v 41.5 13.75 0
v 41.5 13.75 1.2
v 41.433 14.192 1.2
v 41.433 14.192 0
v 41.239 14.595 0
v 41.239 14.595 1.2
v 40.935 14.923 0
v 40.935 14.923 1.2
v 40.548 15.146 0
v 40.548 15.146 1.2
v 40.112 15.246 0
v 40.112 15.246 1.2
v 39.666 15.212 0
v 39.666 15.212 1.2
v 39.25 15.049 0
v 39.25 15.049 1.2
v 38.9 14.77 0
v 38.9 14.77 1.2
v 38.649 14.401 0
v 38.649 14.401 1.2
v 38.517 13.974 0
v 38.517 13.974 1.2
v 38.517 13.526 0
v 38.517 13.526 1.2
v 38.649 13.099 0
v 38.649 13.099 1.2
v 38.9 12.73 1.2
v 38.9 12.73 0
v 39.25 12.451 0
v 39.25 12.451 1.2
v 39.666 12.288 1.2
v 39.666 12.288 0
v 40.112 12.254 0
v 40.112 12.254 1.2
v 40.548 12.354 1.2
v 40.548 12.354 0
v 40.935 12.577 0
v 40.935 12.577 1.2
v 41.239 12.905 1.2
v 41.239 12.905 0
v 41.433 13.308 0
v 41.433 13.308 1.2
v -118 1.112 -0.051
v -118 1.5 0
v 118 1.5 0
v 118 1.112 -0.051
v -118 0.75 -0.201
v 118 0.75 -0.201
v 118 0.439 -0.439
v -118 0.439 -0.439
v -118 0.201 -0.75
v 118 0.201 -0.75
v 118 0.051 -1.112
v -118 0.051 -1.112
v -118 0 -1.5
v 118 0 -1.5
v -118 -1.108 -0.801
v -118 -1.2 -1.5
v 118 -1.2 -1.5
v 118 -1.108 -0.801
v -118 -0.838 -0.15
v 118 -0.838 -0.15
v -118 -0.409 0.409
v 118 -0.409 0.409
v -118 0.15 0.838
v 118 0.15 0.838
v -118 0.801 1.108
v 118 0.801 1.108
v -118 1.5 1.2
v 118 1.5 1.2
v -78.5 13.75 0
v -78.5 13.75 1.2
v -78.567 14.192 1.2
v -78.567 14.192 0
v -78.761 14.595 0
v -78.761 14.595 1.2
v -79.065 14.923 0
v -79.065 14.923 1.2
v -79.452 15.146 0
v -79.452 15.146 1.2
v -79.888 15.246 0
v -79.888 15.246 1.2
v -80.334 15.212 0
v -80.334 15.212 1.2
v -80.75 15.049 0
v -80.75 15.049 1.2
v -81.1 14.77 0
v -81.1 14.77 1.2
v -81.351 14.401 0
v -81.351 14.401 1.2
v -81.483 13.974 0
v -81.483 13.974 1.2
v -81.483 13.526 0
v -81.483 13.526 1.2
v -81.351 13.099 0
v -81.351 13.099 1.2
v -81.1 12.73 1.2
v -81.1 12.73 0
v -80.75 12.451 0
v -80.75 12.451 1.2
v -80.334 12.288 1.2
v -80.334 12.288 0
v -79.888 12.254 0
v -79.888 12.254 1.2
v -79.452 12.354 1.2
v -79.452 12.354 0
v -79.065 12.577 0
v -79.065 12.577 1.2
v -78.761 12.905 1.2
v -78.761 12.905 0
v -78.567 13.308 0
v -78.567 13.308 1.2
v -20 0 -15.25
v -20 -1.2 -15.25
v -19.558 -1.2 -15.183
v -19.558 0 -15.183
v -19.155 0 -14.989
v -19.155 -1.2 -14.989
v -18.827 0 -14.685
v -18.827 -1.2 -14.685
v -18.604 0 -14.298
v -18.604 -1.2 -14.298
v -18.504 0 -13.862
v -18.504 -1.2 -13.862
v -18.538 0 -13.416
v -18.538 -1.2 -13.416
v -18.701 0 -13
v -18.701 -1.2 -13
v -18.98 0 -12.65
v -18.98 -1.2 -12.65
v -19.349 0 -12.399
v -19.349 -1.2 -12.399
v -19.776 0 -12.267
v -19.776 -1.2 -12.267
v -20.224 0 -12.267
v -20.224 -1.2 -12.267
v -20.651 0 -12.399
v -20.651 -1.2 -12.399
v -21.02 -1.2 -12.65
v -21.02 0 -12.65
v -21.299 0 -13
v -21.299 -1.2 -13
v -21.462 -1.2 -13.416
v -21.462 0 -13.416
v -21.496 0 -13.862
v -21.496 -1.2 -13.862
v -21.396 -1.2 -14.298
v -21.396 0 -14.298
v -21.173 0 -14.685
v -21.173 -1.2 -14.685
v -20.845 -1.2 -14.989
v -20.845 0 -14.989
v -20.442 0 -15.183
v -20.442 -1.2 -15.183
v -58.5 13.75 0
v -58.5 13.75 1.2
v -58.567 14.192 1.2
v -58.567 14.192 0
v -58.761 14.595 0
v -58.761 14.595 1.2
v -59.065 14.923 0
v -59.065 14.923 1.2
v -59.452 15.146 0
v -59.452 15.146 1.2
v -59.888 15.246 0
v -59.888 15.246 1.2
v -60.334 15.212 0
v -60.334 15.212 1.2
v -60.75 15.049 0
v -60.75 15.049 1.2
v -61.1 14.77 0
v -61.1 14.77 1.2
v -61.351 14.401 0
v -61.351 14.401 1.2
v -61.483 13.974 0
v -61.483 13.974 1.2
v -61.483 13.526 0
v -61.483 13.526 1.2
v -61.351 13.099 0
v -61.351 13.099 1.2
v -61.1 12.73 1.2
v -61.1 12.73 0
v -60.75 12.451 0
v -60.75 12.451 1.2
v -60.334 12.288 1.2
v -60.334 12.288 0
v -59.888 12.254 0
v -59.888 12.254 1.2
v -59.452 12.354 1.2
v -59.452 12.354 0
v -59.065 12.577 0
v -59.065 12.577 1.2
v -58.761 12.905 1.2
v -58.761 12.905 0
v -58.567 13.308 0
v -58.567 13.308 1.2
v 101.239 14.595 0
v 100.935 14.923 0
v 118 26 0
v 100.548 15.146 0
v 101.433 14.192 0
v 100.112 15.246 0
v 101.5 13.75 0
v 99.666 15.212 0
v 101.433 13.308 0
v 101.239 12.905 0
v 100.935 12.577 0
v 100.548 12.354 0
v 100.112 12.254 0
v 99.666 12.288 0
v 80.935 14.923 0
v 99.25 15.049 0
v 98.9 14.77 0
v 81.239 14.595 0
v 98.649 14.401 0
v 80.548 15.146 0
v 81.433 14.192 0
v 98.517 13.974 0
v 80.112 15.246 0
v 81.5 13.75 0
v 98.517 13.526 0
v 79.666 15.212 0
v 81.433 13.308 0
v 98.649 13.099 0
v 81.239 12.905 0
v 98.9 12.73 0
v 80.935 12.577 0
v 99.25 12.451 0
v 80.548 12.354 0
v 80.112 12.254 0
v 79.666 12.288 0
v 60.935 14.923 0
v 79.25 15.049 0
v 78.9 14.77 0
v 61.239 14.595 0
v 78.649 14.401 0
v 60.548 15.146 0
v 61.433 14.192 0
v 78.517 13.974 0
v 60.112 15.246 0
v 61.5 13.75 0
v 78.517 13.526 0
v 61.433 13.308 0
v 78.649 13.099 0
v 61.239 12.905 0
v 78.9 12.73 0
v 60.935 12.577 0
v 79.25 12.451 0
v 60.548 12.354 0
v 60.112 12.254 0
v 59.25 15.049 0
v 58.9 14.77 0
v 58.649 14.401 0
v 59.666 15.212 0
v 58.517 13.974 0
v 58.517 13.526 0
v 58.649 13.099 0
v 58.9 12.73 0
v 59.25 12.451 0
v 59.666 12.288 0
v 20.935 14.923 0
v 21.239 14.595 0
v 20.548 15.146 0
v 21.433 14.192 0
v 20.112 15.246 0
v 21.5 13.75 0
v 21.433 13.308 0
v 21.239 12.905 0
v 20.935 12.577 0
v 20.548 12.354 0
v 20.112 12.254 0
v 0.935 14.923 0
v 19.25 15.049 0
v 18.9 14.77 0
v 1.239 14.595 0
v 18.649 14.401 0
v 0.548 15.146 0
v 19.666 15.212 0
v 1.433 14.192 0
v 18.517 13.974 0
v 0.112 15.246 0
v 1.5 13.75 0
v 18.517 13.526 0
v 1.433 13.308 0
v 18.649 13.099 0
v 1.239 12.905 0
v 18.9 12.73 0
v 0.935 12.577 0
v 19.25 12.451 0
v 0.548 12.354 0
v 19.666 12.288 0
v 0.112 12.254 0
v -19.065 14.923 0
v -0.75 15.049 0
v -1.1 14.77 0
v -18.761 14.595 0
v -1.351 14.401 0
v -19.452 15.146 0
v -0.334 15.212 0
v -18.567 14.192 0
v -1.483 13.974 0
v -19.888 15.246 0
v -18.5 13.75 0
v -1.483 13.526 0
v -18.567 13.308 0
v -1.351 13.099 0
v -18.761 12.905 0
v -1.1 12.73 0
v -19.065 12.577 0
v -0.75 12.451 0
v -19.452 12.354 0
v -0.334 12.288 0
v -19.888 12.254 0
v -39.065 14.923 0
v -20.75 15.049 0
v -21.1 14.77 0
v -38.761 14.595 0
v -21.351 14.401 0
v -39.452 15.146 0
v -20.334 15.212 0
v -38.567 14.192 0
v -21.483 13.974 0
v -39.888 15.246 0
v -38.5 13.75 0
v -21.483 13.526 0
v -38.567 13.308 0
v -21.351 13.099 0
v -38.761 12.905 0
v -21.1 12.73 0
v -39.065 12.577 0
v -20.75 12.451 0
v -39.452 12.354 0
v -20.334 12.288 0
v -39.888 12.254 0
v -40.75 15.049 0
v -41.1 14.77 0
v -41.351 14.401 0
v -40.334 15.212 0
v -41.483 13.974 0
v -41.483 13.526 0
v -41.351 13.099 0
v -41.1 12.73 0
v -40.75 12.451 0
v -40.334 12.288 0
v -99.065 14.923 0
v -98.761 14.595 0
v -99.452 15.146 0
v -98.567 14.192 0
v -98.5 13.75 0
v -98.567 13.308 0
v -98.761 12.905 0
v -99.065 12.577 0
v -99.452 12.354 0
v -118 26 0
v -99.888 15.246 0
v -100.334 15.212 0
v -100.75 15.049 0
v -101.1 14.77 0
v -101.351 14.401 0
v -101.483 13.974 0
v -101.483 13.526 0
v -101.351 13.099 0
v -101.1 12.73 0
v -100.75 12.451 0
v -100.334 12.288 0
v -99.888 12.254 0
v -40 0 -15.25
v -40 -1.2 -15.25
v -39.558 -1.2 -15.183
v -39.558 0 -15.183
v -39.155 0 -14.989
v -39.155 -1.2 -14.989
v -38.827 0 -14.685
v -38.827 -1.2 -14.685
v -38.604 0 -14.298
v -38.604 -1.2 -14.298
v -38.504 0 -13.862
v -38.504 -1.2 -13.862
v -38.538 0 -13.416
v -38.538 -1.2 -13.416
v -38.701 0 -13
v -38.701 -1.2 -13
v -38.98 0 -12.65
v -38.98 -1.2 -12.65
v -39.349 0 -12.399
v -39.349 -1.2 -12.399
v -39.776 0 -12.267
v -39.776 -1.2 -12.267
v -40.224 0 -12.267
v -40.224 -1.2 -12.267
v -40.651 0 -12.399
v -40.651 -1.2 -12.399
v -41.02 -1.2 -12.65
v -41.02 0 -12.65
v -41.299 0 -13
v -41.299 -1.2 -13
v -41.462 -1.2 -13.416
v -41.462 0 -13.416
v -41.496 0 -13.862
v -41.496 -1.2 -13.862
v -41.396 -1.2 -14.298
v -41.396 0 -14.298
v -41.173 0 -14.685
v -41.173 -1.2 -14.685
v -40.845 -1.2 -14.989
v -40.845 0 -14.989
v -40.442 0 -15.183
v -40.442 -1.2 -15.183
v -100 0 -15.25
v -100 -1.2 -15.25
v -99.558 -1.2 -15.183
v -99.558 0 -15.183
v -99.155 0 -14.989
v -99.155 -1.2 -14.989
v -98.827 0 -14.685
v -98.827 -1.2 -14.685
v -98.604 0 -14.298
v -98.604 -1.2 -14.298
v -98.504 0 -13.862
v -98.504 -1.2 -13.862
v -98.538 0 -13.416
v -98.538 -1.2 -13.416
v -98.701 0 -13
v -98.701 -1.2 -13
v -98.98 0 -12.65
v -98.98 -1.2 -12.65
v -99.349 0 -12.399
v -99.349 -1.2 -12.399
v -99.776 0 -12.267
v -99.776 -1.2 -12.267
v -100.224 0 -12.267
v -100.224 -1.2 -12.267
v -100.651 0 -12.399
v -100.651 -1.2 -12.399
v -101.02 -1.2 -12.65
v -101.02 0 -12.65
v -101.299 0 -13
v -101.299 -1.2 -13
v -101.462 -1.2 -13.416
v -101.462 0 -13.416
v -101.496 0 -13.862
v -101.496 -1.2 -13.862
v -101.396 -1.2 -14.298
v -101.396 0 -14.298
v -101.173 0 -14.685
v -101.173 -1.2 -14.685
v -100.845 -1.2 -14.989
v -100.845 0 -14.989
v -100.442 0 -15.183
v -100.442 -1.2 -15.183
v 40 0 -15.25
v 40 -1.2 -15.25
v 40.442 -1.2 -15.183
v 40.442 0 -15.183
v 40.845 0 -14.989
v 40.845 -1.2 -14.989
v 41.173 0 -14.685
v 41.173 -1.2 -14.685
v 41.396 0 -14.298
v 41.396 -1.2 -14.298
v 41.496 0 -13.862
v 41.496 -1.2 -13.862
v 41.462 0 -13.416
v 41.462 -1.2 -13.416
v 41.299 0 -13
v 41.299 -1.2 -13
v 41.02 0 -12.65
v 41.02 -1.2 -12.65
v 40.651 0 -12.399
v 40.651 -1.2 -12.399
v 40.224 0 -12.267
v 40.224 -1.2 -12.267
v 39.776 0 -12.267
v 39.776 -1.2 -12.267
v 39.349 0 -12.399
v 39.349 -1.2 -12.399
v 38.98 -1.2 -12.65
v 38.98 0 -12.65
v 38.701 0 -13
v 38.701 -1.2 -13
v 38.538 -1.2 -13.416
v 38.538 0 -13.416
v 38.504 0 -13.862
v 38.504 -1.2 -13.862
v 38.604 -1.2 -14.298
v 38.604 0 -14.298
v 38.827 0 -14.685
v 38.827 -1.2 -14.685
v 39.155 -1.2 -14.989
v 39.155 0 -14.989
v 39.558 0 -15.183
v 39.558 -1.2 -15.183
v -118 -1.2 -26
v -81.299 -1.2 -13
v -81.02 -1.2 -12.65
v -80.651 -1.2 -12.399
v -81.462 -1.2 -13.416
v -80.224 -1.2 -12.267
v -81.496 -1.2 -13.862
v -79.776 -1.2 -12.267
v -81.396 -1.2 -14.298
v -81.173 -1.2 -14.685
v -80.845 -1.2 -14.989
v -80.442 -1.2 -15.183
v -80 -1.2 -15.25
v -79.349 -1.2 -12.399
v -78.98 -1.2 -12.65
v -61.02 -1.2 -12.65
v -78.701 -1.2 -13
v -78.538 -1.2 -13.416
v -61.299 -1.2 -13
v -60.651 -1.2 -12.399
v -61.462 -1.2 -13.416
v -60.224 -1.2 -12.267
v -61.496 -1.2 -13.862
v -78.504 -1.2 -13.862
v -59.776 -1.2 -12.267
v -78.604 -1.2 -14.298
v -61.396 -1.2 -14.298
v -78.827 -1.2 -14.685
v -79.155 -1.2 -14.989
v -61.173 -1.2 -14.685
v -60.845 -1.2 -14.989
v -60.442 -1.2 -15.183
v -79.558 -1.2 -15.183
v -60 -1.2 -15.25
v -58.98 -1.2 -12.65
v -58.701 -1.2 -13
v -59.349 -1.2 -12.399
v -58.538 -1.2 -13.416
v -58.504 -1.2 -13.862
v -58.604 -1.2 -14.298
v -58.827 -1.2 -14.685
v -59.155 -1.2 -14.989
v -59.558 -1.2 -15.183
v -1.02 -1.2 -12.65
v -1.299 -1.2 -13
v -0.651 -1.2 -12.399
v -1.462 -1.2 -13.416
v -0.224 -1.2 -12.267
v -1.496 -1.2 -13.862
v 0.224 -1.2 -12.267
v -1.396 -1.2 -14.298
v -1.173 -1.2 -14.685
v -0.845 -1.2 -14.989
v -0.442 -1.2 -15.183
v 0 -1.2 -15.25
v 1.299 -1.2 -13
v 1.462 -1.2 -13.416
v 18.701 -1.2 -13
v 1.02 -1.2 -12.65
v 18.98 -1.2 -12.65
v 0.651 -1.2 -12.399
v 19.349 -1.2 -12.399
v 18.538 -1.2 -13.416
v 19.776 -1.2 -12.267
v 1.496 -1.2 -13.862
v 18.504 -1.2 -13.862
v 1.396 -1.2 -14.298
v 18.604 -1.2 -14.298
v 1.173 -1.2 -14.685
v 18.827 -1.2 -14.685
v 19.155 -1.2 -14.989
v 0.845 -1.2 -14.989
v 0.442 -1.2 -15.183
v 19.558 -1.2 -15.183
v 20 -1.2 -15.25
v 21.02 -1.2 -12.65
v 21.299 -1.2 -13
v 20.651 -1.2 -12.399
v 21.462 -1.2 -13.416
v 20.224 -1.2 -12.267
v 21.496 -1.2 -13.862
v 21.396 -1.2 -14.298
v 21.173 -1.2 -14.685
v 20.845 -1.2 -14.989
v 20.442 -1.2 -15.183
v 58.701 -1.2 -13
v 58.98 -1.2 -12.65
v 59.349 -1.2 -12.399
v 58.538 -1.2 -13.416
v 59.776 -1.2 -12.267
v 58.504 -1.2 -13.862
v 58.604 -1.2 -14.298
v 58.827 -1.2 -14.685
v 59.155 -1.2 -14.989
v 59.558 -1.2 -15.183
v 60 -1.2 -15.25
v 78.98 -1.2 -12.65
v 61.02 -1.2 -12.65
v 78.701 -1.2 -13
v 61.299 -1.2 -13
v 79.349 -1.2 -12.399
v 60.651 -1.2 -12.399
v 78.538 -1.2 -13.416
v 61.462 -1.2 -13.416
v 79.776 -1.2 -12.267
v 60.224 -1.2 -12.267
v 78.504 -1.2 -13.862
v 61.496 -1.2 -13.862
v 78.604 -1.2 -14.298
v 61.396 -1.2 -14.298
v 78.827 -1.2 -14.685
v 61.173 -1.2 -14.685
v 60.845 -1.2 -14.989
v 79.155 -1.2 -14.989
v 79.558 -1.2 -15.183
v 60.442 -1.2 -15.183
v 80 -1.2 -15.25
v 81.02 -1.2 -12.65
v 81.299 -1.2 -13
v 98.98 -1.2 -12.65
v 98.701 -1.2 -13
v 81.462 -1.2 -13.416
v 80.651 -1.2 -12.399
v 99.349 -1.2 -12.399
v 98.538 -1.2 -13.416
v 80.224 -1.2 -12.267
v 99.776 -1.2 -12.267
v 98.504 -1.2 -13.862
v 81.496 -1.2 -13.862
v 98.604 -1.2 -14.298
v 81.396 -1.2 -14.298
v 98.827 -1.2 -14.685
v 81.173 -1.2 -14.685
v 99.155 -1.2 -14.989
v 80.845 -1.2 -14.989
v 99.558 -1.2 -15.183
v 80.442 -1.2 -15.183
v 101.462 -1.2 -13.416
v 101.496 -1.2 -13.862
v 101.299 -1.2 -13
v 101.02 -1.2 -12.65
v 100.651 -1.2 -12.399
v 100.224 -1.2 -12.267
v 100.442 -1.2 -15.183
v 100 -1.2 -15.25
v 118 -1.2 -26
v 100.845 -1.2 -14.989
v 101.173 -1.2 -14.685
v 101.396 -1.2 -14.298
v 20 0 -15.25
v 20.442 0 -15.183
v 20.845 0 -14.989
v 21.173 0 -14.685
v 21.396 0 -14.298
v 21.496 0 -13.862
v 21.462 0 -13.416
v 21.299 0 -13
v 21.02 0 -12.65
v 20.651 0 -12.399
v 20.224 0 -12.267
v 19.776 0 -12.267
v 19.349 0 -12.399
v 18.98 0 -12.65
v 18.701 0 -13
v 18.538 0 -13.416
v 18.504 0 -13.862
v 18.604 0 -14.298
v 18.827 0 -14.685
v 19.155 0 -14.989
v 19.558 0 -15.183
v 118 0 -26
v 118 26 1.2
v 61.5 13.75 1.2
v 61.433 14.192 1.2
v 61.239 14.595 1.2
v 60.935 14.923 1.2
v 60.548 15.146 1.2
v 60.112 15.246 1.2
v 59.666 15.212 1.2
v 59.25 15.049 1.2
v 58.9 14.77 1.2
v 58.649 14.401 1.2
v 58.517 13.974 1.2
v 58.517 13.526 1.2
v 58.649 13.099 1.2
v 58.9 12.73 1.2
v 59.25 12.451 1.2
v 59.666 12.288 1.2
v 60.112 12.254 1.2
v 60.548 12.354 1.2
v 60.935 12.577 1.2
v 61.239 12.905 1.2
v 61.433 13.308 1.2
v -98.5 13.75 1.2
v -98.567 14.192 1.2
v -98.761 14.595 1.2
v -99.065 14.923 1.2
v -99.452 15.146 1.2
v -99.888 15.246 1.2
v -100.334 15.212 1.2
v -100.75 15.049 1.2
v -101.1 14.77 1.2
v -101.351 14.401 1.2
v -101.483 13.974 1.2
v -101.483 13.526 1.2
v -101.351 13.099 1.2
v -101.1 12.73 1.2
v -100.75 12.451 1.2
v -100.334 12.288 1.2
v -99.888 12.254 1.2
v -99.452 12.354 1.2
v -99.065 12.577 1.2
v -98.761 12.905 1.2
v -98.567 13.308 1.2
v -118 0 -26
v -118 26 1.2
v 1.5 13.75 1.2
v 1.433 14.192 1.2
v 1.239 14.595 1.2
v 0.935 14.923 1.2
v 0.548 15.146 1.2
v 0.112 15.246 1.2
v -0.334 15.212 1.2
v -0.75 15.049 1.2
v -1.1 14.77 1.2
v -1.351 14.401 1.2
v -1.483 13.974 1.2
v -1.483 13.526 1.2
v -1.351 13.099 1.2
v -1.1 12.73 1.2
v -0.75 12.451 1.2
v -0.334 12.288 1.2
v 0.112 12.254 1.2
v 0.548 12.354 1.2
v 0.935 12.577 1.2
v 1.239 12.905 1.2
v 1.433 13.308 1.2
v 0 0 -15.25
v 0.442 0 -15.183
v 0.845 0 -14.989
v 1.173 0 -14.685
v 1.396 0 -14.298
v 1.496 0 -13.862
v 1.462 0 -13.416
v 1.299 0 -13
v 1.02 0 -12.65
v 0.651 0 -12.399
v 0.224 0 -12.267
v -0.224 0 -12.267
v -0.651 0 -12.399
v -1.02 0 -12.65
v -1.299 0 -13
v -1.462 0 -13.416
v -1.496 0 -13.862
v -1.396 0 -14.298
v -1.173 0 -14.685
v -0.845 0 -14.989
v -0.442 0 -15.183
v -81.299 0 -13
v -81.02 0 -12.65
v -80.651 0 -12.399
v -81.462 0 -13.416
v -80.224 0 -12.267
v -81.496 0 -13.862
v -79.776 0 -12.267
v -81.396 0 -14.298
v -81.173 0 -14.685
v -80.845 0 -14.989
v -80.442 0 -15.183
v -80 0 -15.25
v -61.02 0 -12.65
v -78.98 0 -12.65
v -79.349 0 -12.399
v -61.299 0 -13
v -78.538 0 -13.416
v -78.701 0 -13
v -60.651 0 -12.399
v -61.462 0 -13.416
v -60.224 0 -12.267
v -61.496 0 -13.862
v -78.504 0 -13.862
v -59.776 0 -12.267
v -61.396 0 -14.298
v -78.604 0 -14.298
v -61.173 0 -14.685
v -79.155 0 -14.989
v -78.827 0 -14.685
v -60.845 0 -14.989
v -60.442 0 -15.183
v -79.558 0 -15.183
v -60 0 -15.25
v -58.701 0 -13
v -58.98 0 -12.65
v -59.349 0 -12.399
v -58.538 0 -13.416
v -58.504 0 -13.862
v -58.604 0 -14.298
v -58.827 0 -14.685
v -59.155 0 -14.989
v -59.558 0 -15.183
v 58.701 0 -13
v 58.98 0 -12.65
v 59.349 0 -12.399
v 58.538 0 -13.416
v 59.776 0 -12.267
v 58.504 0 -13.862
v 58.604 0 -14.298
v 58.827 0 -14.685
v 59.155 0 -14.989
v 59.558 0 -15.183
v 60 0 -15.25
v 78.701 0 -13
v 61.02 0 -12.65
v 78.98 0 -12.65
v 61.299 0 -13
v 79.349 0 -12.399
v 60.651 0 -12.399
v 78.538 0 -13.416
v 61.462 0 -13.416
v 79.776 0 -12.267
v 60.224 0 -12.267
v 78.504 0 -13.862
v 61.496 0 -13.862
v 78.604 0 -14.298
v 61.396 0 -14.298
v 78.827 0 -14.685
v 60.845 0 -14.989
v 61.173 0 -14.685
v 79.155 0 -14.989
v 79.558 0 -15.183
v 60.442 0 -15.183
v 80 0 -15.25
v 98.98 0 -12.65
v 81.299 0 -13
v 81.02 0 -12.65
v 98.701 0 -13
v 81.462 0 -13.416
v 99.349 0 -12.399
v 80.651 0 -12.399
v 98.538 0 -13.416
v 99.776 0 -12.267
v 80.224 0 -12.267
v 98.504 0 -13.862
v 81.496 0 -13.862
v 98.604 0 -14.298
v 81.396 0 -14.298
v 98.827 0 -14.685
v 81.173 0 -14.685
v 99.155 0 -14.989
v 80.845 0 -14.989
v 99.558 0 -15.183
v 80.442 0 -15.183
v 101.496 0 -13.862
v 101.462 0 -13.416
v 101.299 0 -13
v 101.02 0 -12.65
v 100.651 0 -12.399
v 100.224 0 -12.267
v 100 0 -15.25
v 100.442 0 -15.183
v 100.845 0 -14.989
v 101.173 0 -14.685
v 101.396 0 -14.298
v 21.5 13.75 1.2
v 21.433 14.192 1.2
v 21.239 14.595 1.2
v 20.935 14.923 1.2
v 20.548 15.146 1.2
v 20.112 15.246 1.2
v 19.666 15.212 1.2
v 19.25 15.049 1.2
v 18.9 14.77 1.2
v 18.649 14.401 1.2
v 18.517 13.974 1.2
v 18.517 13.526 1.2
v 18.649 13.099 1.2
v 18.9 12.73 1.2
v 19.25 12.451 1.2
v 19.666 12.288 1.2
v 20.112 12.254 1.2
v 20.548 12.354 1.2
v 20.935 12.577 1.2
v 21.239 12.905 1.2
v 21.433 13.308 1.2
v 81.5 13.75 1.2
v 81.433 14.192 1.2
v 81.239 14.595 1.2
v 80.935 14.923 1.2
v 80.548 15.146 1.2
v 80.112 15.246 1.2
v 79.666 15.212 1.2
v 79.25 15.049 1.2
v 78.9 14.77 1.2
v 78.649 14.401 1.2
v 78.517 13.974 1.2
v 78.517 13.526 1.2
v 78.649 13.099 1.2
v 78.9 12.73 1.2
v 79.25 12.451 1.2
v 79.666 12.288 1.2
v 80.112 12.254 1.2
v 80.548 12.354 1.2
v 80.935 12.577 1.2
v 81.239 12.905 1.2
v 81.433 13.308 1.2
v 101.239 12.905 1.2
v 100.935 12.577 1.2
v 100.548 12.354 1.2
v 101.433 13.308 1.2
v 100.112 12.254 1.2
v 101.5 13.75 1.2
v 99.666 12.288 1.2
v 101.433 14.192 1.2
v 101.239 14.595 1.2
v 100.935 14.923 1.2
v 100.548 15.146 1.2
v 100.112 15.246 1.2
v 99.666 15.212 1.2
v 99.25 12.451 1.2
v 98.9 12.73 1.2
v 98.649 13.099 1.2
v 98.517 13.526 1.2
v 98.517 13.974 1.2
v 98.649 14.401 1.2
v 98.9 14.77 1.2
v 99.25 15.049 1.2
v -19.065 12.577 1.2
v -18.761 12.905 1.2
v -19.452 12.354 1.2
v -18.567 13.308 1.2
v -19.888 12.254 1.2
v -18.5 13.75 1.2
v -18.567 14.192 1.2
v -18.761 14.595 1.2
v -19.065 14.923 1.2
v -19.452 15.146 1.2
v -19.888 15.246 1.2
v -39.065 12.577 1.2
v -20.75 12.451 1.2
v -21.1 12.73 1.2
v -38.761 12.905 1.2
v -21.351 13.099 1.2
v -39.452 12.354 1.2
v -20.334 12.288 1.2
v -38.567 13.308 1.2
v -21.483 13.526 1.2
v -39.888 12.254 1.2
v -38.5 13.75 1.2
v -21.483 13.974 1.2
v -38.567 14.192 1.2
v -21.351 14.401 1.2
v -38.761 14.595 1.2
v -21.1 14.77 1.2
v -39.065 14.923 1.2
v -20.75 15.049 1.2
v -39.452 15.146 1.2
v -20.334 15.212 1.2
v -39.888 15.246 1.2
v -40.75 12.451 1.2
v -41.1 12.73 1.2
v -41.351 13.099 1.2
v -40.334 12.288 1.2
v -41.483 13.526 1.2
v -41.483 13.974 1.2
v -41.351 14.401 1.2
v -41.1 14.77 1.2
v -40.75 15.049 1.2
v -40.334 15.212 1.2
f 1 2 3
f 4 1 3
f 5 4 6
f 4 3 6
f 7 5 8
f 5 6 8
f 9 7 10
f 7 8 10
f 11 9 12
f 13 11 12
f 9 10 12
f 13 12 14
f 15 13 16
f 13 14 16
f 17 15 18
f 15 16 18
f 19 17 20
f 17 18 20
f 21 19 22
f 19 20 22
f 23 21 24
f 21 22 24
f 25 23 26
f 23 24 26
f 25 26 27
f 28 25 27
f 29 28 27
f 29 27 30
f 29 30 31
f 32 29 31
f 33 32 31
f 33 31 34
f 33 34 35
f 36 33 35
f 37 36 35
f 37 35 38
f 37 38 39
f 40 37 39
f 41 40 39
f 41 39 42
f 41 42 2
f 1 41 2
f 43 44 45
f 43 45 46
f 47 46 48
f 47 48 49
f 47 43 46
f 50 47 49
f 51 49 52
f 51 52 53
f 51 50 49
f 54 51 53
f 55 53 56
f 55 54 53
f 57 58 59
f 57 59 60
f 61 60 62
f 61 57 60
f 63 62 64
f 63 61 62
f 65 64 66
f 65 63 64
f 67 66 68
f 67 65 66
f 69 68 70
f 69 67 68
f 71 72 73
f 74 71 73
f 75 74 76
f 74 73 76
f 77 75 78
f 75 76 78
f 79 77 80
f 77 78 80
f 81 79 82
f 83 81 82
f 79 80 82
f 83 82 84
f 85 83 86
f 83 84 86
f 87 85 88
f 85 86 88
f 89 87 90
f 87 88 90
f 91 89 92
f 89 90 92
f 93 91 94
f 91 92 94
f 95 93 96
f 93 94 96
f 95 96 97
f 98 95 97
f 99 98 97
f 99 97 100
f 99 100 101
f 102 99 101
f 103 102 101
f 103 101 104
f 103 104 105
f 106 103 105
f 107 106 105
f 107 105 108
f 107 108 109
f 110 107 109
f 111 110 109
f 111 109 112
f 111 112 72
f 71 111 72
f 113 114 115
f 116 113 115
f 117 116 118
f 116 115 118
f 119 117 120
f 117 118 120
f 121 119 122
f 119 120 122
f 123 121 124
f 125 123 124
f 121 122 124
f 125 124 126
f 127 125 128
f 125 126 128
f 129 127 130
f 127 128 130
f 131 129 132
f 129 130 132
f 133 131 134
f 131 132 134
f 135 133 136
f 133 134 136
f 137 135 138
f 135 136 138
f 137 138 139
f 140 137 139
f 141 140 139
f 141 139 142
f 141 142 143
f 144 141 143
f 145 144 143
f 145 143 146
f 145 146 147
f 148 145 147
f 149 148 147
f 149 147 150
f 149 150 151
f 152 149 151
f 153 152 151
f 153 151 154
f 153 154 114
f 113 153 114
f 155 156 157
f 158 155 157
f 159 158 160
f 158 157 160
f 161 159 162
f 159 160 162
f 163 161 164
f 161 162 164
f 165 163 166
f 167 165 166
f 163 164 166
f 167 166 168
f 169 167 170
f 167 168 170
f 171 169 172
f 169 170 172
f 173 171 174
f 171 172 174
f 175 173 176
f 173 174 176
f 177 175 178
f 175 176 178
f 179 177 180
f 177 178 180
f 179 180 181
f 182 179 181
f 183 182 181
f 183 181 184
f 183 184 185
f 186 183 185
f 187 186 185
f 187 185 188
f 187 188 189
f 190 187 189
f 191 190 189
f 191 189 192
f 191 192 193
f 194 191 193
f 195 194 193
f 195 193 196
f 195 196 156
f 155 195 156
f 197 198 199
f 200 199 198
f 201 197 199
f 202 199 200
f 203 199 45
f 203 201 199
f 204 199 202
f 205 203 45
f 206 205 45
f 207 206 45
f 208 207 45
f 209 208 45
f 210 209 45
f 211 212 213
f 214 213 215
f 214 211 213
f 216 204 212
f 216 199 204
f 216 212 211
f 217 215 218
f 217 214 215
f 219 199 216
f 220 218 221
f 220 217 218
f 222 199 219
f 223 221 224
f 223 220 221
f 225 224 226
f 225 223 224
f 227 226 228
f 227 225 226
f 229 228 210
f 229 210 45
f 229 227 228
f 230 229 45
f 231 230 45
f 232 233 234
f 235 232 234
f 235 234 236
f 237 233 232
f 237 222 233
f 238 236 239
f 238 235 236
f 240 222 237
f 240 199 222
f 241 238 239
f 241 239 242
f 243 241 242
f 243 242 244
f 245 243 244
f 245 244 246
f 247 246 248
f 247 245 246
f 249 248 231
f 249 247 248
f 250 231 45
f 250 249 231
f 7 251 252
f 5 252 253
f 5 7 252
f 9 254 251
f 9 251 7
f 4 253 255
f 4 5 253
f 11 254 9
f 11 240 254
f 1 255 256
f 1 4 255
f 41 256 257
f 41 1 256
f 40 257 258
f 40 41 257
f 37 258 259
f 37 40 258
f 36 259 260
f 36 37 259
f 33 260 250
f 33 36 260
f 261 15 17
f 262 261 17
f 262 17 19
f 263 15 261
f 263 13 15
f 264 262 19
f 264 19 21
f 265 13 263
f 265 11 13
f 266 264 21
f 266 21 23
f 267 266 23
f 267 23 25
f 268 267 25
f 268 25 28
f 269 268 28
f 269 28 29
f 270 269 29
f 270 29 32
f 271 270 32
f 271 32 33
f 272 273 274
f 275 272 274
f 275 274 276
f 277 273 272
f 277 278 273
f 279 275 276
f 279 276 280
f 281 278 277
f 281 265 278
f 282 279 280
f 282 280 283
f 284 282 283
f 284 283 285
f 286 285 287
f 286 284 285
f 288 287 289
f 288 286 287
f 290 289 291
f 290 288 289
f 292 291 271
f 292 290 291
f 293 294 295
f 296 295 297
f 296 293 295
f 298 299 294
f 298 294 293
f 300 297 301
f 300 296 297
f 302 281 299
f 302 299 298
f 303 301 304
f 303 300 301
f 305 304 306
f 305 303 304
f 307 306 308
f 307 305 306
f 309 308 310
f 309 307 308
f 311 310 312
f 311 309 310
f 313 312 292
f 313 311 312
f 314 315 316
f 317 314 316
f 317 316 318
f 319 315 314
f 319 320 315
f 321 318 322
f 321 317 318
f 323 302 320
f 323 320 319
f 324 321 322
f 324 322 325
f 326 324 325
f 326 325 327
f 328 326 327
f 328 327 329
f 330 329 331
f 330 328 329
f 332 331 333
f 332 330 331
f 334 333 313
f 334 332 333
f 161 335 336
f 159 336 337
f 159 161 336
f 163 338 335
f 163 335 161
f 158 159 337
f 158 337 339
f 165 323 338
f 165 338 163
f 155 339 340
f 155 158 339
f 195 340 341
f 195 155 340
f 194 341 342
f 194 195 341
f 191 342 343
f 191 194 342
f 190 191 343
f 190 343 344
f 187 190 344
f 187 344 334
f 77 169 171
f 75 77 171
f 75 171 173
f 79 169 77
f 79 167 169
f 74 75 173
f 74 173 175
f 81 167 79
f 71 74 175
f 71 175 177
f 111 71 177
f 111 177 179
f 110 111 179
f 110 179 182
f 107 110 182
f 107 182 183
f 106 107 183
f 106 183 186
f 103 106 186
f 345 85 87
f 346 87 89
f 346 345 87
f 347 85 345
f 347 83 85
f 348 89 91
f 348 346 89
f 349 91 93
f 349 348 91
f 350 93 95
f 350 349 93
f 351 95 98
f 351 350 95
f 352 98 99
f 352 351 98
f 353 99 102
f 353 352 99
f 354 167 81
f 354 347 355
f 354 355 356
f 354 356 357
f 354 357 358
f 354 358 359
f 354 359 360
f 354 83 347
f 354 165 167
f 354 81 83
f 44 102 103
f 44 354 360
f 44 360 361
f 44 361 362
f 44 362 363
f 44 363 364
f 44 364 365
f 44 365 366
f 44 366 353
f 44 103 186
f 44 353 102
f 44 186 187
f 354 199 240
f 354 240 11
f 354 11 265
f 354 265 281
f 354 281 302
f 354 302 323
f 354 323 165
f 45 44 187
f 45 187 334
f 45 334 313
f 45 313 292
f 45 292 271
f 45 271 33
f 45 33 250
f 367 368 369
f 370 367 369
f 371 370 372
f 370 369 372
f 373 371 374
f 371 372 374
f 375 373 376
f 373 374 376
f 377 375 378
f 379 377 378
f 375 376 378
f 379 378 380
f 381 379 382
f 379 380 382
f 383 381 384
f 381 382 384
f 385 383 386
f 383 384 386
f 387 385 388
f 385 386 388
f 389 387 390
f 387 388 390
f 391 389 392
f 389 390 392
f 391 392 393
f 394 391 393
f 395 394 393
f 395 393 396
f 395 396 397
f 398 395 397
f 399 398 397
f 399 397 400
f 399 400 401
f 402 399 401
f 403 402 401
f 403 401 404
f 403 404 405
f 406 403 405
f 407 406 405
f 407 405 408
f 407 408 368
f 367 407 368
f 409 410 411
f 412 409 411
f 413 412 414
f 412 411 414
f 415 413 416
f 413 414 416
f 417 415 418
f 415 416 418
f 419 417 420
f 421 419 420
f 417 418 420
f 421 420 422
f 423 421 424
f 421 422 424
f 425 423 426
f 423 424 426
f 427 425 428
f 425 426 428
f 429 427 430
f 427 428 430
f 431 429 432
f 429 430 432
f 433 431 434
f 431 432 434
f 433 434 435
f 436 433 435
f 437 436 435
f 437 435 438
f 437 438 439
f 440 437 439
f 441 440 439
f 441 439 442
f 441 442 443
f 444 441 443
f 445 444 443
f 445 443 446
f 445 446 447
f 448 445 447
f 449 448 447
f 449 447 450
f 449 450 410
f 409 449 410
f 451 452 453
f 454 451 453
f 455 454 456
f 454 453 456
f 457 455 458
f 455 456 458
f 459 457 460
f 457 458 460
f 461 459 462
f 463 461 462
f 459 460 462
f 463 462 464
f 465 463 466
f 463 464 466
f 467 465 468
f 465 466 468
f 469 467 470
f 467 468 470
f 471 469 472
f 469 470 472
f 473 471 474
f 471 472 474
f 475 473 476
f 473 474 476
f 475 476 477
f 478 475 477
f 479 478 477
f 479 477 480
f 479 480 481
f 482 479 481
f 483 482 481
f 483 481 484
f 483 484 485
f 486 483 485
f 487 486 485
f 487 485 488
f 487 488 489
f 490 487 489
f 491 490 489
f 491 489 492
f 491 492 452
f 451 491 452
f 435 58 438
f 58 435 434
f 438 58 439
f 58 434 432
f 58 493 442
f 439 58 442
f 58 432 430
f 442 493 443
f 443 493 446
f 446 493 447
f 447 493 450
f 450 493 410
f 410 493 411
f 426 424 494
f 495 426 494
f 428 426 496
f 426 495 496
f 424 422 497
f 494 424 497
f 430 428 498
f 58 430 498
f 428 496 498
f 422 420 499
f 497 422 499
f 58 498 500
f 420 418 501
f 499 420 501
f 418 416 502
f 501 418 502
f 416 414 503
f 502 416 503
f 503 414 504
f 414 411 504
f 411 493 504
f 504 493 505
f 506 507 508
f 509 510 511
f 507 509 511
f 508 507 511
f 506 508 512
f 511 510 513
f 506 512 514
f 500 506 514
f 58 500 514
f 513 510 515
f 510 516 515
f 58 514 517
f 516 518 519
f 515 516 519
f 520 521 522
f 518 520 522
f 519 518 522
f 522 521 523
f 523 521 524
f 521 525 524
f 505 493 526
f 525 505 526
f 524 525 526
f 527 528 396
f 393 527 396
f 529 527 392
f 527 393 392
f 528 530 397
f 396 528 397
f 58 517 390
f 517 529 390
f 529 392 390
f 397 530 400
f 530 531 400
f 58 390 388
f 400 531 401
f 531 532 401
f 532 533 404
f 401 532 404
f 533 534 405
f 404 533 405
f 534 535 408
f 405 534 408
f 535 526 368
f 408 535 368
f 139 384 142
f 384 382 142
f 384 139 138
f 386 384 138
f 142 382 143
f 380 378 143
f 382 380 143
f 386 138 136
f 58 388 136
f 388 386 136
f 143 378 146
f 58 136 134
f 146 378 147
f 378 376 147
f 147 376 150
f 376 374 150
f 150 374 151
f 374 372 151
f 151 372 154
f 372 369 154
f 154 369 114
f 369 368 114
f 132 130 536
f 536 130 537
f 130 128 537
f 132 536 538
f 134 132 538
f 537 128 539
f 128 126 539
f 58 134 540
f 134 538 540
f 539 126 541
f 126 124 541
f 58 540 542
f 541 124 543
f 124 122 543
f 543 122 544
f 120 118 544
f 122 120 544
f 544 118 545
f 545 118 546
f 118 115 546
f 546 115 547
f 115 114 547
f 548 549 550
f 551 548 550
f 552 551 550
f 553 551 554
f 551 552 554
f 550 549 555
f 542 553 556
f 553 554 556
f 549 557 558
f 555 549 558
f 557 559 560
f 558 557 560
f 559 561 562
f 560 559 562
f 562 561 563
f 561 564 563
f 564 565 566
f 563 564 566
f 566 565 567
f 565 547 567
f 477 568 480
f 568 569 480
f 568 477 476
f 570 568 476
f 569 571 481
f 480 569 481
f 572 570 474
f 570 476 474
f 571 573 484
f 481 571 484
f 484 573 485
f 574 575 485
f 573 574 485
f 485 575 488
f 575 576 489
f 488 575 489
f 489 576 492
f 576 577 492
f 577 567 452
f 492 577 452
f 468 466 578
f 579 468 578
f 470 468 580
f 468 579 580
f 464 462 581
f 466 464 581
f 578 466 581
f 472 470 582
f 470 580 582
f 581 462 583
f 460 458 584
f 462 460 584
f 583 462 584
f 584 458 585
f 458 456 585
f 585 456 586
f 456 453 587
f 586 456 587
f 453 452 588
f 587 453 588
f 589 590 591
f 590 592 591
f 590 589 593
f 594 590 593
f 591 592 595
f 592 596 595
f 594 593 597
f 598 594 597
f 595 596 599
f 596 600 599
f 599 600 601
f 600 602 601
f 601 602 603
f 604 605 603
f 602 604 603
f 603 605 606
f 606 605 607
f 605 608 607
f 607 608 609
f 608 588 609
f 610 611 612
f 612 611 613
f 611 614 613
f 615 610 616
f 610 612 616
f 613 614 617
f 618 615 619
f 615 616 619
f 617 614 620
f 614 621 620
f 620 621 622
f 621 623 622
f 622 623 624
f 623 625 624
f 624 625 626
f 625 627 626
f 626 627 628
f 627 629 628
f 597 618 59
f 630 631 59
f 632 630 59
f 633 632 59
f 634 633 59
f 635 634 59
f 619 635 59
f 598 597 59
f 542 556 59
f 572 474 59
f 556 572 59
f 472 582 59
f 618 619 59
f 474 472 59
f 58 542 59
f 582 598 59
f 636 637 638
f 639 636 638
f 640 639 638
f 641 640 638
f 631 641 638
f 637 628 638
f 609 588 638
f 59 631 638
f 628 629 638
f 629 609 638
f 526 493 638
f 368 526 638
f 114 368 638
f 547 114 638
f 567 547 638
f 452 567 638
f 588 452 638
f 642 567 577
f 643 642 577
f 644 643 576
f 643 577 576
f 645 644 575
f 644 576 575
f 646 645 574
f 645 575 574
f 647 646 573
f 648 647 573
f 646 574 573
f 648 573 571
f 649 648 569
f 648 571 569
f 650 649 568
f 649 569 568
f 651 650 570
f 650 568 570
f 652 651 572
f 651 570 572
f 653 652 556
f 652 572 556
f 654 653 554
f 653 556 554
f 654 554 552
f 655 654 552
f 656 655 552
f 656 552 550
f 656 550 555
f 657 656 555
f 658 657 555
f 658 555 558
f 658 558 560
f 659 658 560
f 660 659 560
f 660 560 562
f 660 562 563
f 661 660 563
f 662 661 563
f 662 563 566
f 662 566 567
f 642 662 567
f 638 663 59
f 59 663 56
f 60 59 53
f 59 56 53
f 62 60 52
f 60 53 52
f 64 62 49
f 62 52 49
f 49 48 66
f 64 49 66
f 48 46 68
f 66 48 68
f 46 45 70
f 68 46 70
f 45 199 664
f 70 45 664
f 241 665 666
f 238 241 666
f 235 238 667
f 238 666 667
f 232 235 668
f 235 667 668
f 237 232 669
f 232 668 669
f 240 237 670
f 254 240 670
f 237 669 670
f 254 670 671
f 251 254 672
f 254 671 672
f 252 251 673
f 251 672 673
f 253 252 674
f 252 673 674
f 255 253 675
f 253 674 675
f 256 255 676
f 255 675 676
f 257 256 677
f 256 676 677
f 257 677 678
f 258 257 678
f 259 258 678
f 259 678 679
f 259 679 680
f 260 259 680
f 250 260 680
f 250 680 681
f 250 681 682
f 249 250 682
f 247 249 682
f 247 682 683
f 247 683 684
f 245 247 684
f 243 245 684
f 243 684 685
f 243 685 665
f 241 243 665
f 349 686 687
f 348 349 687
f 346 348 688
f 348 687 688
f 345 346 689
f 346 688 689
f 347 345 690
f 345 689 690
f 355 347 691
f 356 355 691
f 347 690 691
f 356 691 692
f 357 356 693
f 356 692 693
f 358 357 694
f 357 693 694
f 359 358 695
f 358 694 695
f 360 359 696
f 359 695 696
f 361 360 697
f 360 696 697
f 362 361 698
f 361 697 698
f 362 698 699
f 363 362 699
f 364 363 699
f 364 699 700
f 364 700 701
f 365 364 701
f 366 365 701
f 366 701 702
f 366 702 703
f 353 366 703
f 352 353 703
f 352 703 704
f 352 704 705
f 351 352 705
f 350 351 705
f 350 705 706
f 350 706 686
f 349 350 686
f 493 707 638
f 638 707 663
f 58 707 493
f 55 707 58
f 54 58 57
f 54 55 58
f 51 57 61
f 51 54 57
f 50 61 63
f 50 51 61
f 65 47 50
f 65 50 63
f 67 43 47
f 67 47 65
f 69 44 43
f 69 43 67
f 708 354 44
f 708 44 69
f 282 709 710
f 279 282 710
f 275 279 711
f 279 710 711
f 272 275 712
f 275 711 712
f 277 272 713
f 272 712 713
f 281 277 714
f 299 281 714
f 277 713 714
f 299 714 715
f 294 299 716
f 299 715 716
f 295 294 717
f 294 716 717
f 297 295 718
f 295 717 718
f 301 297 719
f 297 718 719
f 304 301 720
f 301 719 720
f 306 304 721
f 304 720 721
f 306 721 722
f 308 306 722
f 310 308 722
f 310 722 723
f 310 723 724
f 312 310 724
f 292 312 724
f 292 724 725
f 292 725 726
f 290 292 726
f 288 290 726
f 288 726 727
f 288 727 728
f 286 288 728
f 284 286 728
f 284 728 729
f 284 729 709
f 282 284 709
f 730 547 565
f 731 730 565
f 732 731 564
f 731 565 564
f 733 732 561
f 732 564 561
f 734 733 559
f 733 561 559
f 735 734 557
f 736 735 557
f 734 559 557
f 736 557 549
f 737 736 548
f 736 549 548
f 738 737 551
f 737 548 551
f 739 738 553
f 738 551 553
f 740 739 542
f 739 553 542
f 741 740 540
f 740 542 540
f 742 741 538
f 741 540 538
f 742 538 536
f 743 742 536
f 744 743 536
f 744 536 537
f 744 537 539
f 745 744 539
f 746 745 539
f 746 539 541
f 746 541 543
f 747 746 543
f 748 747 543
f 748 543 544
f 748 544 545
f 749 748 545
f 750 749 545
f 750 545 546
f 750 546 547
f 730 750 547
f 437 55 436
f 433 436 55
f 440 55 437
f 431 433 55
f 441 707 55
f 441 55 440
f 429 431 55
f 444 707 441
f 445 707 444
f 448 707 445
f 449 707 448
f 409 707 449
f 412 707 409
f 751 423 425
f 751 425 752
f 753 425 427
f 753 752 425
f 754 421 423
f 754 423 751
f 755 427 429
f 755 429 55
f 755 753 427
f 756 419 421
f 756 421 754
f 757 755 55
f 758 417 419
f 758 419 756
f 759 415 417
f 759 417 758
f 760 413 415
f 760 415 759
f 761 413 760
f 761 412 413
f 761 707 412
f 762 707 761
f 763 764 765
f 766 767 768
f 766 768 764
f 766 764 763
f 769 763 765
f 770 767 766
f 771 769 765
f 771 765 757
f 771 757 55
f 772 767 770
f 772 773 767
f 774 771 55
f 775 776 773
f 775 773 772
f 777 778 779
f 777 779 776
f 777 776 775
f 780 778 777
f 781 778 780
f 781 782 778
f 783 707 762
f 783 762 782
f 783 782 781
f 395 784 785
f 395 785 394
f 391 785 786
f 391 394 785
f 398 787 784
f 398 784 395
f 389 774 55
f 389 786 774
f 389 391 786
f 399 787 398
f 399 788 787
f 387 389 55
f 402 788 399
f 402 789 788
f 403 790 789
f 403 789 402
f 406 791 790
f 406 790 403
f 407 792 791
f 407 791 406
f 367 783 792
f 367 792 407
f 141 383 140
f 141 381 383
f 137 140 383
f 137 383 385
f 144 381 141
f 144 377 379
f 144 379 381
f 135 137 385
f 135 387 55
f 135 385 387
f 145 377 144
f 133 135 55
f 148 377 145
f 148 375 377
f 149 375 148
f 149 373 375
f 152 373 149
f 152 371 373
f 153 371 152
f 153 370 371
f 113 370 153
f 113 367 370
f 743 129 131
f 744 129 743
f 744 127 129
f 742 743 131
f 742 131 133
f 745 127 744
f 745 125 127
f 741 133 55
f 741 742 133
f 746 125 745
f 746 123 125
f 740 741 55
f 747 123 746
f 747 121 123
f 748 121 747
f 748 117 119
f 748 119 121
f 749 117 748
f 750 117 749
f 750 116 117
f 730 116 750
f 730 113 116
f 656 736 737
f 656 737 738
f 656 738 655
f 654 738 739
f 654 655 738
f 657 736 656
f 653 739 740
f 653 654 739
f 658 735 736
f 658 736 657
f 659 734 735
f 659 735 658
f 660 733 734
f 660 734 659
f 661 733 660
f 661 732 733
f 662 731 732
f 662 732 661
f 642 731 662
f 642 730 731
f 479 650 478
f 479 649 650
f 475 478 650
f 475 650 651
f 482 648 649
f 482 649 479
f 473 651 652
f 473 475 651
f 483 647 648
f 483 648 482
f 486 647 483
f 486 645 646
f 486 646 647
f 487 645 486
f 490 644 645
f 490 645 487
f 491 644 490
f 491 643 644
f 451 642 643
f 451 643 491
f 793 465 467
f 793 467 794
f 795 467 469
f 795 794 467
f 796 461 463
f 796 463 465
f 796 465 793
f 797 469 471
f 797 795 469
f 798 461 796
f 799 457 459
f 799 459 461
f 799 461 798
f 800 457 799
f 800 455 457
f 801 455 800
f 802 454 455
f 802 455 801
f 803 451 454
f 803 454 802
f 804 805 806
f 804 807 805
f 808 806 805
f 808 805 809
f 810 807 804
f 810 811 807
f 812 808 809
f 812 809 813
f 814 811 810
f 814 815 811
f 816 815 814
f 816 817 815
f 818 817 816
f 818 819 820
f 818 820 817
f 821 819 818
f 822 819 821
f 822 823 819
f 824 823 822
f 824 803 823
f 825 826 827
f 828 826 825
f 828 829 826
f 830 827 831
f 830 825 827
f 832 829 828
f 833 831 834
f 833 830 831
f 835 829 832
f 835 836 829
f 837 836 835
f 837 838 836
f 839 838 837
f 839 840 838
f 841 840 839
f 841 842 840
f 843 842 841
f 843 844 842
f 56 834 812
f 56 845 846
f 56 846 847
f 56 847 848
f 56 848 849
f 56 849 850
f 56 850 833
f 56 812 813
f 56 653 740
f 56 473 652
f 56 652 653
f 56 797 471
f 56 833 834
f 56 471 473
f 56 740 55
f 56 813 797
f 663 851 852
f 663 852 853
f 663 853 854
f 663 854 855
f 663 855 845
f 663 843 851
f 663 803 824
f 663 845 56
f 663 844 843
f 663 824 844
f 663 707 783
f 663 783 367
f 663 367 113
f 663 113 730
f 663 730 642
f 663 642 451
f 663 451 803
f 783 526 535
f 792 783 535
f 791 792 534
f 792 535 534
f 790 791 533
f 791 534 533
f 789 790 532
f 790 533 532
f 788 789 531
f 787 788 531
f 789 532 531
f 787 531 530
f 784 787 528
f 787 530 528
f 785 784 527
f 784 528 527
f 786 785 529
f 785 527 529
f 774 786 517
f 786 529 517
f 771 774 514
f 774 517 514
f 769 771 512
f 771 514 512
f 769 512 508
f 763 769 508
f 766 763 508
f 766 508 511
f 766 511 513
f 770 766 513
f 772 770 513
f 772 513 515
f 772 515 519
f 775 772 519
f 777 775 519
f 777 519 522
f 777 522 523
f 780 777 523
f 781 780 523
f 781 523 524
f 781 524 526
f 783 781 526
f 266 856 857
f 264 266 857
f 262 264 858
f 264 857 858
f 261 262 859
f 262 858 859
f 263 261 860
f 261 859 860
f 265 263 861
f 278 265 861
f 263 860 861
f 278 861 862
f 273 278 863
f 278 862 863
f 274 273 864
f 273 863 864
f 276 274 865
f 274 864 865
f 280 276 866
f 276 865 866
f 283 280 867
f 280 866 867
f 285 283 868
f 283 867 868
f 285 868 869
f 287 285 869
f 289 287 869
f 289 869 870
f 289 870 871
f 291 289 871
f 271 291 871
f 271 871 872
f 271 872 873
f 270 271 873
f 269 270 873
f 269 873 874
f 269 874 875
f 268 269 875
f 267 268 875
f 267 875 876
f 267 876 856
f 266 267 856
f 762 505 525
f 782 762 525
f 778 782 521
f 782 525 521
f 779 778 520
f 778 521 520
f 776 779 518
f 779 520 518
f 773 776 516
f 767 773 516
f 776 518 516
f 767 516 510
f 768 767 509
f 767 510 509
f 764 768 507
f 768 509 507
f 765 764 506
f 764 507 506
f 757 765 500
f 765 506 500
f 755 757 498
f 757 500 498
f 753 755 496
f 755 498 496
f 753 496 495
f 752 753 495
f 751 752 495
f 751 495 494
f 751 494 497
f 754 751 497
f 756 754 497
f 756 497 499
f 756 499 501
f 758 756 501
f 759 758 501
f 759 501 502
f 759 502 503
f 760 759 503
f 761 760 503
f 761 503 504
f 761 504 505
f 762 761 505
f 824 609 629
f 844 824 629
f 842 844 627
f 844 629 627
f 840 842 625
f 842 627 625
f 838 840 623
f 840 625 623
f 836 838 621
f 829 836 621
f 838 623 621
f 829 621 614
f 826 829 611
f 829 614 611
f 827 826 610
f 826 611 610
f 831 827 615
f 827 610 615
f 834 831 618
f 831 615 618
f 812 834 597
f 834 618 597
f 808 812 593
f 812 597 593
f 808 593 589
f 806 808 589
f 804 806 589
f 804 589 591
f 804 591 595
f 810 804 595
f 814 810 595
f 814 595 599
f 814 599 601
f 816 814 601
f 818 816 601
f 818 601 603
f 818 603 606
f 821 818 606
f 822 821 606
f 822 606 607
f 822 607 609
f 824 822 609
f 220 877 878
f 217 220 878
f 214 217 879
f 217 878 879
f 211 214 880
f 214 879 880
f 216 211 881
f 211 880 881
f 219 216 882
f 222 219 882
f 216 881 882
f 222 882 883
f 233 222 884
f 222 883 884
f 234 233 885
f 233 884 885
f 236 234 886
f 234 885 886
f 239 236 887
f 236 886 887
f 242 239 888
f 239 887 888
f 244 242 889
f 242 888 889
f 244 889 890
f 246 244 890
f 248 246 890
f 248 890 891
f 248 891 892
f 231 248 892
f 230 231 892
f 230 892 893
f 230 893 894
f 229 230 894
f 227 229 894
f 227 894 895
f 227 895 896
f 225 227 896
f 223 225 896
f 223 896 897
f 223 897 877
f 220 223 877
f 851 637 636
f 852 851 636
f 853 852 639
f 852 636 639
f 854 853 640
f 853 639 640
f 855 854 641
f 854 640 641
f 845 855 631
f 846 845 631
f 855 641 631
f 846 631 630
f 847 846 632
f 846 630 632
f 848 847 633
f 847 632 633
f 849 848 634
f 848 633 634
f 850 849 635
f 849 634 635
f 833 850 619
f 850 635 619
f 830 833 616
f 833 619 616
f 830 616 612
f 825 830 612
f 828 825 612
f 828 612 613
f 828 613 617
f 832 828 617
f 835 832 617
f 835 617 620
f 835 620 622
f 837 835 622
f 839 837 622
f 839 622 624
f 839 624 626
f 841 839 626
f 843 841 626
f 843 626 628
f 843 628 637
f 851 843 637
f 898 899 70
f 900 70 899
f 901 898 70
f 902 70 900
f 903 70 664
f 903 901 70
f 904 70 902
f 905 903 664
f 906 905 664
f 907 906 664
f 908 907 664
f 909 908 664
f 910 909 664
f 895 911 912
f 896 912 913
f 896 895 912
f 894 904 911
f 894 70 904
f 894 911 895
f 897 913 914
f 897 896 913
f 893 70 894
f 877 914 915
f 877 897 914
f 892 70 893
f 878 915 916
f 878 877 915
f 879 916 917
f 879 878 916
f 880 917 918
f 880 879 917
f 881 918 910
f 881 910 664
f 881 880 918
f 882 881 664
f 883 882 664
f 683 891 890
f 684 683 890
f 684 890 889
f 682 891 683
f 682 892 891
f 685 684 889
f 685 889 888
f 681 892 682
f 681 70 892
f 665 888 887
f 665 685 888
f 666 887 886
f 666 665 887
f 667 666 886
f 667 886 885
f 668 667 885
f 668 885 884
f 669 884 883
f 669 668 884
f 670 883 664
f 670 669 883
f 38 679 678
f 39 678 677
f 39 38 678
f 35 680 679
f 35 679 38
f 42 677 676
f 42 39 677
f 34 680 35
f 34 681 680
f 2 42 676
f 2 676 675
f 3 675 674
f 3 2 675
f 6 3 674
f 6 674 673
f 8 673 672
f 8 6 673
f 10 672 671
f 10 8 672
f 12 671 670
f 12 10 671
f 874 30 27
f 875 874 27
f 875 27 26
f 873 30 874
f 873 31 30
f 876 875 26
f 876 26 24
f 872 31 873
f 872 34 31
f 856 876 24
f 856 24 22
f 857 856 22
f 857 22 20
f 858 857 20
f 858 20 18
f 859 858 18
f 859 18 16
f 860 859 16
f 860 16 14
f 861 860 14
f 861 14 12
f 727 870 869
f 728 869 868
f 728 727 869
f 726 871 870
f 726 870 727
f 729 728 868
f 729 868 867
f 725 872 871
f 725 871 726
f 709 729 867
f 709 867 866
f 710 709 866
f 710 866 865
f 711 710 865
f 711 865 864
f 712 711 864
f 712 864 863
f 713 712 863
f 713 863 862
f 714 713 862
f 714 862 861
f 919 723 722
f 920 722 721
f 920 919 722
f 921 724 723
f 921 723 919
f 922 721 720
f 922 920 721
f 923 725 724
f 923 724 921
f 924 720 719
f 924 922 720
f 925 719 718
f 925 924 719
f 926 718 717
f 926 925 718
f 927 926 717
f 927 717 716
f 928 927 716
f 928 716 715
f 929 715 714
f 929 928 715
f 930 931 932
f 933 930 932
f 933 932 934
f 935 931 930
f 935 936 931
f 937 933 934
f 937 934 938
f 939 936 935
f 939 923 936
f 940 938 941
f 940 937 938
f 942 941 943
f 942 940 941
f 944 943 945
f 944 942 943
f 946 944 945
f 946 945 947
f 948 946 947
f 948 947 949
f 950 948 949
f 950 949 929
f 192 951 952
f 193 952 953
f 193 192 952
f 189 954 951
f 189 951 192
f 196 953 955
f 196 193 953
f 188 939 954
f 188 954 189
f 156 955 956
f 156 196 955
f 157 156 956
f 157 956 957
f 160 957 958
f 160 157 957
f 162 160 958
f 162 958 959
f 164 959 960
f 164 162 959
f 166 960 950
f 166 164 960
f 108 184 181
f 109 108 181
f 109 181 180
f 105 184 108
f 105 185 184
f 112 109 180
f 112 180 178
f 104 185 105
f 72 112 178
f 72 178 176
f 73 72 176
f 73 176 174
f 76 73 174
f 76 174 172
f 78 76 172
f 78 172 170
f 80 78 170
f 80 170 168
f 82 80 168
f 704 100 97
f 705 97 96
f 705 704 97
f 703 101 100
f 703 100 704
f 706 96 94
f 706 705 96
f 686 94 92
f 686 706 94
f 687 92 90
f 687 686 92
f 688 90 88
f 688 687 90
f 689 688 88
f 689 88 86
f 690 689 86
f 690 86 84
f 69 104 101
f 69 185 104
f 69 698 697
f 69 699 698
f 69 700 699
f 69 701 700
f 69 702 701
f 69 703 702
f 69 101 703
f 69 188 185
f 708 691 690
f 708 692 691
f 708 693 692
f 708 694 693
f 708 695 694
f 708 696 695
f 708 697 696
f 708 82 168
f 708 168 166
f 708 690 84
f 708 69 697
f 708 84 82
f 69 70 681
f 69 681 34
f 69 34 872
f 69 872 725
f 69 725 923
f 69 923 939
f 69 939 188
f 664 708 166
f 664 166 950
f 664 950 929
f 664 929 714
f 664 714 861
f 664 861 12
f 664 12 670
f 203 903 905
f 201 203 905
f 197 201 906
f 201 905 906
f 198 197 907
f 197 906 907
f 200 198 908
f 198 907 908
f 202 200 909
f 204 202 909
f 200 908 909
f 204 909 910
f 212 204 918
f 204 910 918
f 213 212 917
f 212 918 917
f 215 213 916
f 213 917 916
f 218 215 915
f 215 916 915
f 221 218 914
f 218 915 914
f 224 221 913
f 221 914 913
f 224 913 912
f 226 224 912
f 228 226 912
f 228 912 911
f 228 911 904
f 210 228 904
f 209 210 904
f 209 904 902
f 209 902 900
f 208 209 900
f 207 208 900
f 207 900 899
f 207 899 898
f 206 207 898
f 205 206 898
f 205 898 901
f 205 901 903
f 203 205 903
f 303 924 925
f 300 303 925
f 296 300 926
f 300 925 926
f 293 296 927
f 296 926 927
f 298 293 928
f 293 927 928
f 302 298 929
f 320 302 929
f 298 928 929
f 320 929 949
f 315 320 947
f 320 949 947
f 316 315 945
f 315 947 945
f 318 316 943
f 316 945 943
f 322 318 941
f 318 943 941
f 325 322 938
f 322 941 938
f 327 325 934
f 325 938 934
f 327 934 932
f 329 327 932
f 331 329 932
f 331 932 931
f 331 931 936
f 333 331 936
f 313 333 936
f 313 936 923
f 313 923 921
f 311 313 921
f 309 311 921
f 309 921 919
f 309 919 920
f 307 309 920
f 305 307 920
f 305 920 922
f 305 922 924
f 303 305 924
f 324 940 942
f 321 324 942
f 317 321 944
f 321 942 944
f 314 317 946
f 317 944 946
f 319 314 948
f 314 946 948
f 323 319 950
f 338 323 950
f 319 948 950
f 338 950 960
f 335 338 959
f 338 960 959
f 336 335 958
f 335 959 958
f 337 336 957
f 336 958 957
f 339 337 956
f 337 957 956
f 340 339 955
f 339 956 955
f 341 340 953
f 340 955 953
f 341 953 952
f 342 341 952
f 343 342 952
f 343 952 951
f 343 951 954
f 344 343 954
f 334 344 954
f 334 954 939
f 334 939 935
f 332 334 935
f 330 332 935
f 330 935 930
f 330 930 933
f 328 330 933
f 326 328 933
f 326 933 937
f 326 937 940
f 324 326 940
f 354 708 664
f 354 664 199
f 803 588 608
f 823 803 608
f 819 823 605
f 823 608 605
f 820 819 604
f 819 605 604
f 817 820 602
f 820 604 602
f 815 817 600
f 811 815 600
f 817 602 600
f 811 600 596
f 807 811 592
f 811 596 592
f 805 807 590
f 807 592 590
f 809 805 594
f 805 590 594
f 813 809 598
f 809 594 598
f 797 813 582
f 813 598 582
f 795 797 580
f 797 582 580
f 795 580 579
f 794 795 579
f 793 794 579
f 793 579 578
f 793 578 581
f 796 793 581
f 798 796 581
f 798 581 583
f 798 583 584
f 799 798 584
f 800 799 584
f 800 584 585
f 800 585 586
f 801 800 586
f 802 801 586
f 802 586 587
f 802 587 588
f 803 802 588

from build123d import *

# Parameters (mm, degrees)
SKETCH1_W                    = 236
SKETCH1_H                    = 26
BASE_FLANGE1_DEPTH           = 1.2
EDGE_FLANGE1_STRIP_W         = 7.8
EDGE_FLANGE1_STRIP_H         = 1.2
EDGE_FLANGE1_STRIP_CUT_DEPTH = 236
EDGE_FLANGE1_DEPTH           = 236
SKETCH9_R                    = 1.5
CUT_EXTRUDE1_DEPTH           = 10
SKETCH10_R                   = 1.5
CUT_EXTRUDE2_DEPTH           = 10


# Sheet-metal steps are written as plain solids
with BuildPart() as part:
    # Sketch1 → Base-Flange1 (new body)
    with BuildSketch(Plane(origin=(0, 0, 0), x_dir=(1, 0, 0), z_dir=(0, 1, 0))):
        with Locations((0, 13)):
            Rectangle(SKETCH1_W, SKETCH1_H)
    extrude(amount=-BASE_FLANGE1_DEPTH)

    # Edge-Flange1 strip (across the edge) → Edge-Flange1 strip cut (cut)
    with BuildSketch(Plane(origin=(-118, 0, 0), x_dir=(0, 0, -1), z_dir=(1, 0, 0))):
        with Locations((-2.4, -0.6)):
            Rectangle(EDGE_FLANGE1_STRIP_W, EDGE_FLANGE1_STRIP_H)
    extrude(amount=EDGE_FLANGE1_STRIP_CUT_DEPTH, mode=Mode.SUBTRACT)

    # Edge-Flange1 section (across the edge) → Edge-Flange1 (add)
    with BuildSketch(Plane(origin=(-118, 0, 0), x_dir=(0, 0, -1), z_dir=(1, 0, 0))):
        with BuildLine():
            Line((-1.2, 1.5), (-1.2, 26))
            Line((-1.2, 26), (0, 26))
            Line((0, 26), (0, 1.5))
            ThreePointArc((0, 1.5), (0.439339828, 0.439339828), (1.5, 0))
            Line((1.5, 0), (1.5, -1.2))
            ThreePointArc((1.5, -1.2), (-0.409188309, -0.409188309), (-1.2, 1.5))
        make_face()
    extrude(amount=EDGE_FLANGE1_DEPTH)

    # Sketch9 → Cut-Extrude1 (cut)
    with BuildSketch(Plane.XZ.offset(1.2)):
        with Locations(Location((-100, -13.75, 0), (0, 0, 270))):
            Circle(SKETCH9_R)
        with Locations(Location((-80, -13.75, 0), (0, 0, 270))):
            Circle(SKETCH9_R)
        with Locations(Location((-60, -13.75, 0), (0, 0, 270))):
            Circle(SKETCH9_R)
        with Locations(Location((-40, -13.75, 0), (0, 0, 270))):
            Circle(SKETCH9_R)
        with Locations(Location((-20, -13.75, 0), (0, 0, 270))):
            Circle(SKETCH9_R)
        with Locations(Location((0, -13.75, 0), (0, 0, 270))):
            Circle(SKETCH9_R)
        with Locations(Location((20, -13.75, 0), (0, 0, 270))):
            Circle(SKETCH9_R)
        with Locations(Location((40, -13.75, 0), (0, 0, 270))):
            Circle(SKETCH9_R)
        with Locations(Location((60, -13.75, 0), (0, 0, 270))):
            Circle(SKETCH9_R)
        with Locations(Location((80, -13.75, 0), (0, 0, 270))):
            Circle(SKETCH9_R)
        with Locations(Location((100, -13.75, 0), (0, 0, 270))):
            Circle(SKETCH9_R)
    extrude(amount=-CUT_EXTRUDE1_DEPTH, mode=Mode.SUBTRACT)

    # Sketch10 → Cut-Extrude2 (cut)
    with BuildSketch(Plane.XY.offset(1.2)):
        with Locations((-100, 13.75)):
            Circle(SKETCH10_R)
        with Locations((-80, 13.75)):
            Circle(SKETCH10_R)
        with Locations((-60, 13.75)):
            Circle(SKETCH10_R)
        with Locations((-40, 13.75)):
            Circle(SKETCH10_R)
        with Locations((-20, 13.75)):
            Circle(SKETCH10_R)
        with Locations((0, 13.75)):
            Circle(SKETCH10_R)
        with Locations((20, 13.75)):
            Circle(SKETCH10_R)
        with Locations((40, 13.75)):
            Circle(SKETCH10_R)
        with Locations((60, 13.75)):
            Circle(SKETCH10_R)
        with Locations((80, 13.75)):
            Circle(SKETCH10_R)
        with Locations((100, 13.75)):
            Circle(SKETCH10_R)
    extrude(amount=-CUT_EXTRUDE2_DEPTH, mode=Mode.SUBTRACT)


solid = part.part
